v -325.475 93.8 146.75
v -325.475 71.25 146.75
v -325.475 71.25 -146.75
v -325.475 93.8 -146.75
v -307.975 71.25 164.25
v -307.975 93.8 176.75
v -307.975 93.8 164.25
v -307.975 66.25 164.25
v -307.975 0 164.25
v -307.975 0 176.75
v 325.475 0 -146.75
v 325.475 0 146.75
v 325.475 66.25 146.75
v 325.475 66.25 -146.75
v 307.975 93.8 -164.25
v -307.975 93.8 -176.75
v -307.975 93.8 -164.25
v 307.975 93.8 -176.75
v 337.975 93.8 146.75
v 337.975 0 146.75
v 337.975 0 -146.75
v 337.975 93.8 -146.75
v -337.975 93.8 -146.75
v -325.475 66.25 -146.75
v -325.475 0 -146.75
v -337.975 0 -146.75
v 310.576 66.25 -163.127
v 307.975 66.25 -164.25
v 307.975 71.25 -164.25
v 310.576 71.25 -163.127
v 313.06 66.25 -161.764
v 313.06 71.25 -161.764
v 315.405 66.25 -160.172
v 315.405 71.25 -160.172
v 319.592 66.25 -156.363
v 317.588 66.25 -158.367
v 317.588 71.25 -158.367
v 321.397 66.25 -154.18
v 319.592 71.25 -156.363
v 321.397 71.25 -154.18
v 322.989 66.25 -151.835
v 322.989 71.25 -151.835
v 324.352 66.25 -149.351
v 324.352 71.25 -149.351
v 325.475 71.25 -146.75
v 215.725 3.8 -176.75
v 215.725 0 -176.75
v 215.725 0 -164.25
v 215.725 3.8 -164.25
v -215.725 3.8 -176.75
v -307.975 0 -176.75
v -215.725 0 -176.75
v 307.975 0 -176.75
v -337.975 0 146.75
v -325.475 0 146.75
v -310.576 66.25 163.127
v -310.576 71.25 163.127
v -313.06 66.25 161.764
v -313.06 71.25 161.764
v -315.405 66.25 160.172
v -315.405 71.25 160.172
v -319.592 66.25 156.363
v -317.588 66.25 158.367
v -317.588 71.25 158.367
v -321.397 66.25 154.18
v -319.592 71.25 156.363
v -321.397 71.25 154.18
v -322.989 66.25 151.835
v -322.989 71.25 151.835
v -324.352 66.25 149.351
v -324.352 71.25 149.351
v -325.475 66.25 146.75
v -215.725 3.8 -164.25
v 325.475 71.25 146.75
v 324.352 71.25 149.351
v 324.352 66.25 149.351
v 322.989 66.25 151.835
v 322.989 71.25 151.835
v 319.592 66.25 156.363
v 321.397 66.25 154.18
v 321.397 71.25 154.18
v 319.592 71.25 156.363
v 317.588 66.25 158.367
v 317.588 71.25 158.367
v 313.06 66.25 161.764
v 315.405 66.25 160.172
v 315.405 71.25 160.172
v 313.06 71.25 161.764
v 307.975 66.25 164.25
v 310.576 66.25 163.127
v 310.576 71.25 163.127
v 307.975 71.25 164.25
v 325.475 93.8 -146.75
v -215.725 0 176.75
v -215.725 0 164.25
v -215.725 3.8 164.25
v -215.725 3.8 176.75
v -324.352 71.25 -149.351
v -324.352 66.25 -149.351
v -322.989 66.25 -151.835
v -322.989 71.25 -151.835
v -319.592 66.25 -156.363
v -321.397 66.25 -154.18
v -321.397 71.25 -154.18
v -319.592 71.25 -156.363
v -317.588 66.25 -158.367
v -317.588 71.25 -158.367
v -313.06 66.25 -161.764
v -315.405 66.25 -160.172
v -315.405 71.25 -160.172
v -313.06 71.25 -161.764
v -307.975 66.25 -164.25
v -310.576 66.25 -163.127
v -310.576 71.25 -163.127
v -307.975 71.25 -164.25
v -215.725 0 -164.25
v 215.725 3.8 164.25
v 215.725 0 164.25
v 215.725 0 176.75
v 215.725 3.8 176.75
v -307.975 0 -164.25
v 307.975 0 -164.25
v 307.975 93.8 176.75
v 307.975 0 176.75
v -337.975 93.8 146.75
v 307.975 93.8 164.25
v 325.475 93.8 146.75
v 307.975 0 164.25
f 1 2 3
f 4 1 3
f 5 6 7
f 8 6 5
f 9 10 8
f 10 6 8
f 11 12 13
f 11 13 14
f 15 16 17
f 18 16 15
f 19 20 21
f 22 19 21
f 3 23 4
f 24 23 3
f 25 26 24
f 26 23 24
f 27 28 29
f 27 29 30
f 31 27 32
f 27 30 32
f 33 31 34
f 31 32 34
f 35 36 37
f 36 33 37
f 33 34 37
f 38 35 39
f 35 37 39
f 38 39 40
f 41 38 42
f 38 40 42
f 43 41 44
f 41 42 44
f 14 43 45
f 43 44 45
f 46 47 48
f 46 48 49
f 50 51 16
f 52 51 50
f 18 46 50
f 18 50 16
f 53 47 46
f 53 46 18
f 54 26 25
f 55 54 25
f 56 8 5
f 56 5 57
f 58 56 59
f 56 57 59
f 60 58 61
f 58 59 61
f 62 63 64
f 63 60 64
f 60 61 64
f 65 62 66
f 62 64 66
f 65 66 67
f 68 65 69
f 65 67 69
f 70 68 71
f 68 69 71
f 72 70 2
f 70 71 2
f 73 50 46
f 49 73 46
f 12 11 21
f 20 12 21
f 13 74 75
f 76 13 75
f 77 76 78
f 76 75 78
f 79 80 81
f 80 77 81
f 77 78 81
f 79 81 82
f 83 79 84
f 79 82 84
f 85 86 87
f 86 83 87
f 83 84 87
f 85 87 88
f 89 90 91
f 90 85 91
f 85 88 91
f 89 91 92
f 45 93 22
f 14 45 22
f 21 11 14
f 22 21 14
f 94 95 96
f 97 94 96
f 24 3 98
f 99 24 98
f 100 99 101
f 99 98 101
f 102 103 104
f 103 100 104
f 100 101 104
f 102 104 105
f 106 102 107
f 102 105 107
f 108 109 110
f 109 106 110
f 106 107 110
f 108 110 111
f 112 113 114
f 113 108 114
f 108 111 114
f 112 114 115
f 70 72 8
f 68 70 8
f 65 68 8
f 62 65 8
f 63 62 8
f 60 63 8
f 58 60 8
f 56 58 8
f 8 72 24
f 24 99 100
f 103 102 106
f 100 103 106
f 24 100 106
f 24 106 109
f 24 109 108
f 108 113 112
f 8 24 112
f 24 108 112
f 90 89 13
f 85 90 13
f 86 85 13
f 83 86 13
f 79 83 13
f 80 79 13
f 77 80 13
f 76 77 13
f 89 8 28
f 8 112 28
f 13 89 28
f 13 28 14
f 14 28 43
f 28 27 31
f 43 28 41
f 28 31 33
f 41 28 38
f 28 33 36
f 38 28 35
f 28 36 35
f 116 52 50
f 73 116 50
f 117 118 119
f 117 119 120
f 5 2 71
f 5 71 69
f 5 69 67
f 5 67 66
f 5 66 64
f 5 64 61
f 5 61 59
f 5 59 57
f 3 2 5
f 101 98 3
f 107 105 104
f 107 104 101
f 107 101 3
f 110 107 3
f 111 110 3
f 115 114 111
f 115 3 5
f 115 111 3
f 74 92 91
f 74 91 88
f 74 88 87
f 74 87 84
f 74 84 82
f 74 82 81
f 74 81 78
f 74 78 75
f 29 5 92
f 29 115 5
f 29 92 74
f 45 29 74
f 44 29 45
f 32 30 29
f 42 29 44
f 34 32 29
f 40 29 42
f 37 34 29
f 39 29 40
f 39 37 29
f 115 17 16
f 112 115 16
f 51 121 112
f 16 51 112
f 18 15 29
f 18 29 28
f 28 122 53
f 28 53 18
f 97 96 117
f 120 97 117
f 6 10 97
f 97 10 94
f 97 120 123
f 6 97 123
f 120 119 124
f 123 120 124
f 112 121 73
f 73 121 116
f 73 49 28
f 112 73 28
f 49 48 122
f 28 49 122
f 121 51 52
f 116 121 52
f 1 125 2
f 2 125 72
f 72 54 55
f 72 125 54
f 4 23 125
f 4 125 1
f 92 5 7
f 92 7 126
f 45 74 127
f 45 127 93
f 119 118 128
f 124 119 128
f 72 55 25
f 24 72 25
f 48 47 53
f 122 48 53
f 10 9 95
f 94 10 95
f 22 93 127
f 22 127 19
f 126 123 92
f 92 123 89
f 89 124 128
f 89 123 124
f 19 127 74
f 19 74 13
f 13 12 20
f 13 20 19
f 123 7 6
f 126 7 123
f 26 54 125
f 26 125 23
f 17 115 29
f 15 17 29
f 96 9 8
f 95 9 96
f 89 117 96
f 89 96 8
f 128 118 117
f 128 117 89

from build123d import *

# Parameters (mm, degrees)
SKETCH1_W             = 12.5
SKETCH1_H             = 293.5
BOSS_EXTRUDE1_DEPTH   = 93.8
SKETCH1_W_2           = 615.95
SKETCH1_H_2           = 12.5
BOSS_EXTRUDE1_2_DEPTH = 93.8
BOSS_EXTRUDE1_3_DEPTH = 93.8
BOSS_EXTRUDE1_4_DEPTH = 93.8
SKETCH2_W             = 650.95
SKETCH2_H             = 328.5
BOSS_EXTRUDE2_DEPTH   = 5
FILLET2_R             = 30
SKETCH4_W             = 215.725
SKETCH4_H             = 3.8
CUT_EXTRUDE1_DEPTH    = 498.983725261


with BuildPart() as part:
    # Sketch1 → Boss-Extrude1 (new body)
    with BuildSketch(Plane(origin=(0, 0, 0), x_dir=(1, 0, 0), z_dir=(0, 1, 0))):
        with Locations((-331.725, 0)):
            Rectangle(SKETCH1_W, SKETCH1_H)
    extrude(amount=BOSS_EXTRUDE1_DEPTH)



with BuildPart() as body_2:
    # Sketch1 → Boss-Extrude1 2 (new body)
    with BuildSketch(Plane(origin=(0, 0, 0), x_dir=(1, 0, 0), z_dir=(0, 1, 0))):
        with Locations((0, 170.5)):
            Rectangle(SKETCH1_W_2, SKETCH1_H_2)
    extrude(amount=BOSS_EXTRUDE1_2_DEPTH)


with BuildPart() as body_3:
    # Sketch1 → Boss-Extrude1 3 (new body)
    with BuildSketch(Plane(origin=(0, 0, 0), x_dir=(1, 0, 0), z_dir=(0, 1, 0))):
        with Locations((331.725, 0)):
            Rectangle(SKETCH1_W, SKETCH1_H)
    extrude(amount=BOSS_EXTRUDE1_3_DEPTH)


with BuildPart() as body_4:
    # Sketch1 → Boss-Extrude1 4 (new body)
    with BuildSketch(Plane(origin=(0, 0, 0), x_dir=(1, 0, 0), z_dir=(0, 1, 0))):
        with Locations((0, -170.5)):
            Rectangle(SKETCH1_W_2, SKETCH1_H_2)
    extrude(amount=BOSS_EXTRUDE1_4_DEPTH)


with BuildPart() as part_1:
    add(part.part)

    add(body_2.part)  # Boss-Extrude2 merges body 2

    add(body_3.part)  # Boss-Extrude2 merges body 3

    add(body_4.part)  # Boss-Extrude2 merges body 4
    # Sketch2 → Boss-Extrude2 (add)
    with BuildSketch(Plane(origin=(0, 71.25, 0), x_dir=(1, 0, 0), z_dir=(0, 1, 0))):
        Rectangle(SKETCH2_W, SKETCH2_H)
    extrude(amount=-BOSS_EXTRUDE2_DEPTH)

    # Fillet2
    # the kernel refuses this fillet: 30 mm, written as the material it takes off along each edge
    with BuildSketch(Plane(origin=(-325.475, 115, 164.25), x_dir=(1, 0, 0), z_dir=(0, -1, 0)), Plane(origin=(-325.475, 115, -164.25), x_dir=(0, 0, 1), z_dir=(0, -1, 0)), Plane(origin=(325.475, 115, -164.25), x_dir=(-1, 0, 0), z_dir=(0, -1, 0)), Plane(origin=(325.475, 115, 164.25), x_dir=(0, 0, -1), z_dir=(0, -1, 0))) as fillet2_piece_1:
        with BuildLine():
            CenterArc((28.074531042, -28.074531042), FILLET2_R, 110.63934566, 48.721308679)
            Line((0, -17.5), (0, 0))
            Line((0, 0), (17.5, 0))
        make_face()
    extrude(amount=92.5, mode=Mode.SUBTRACT)

    # Sketch4 → Cut-Extrude1 (cut, through all)
    with BuildSketch(Plane(origin=(0, 0, -176.75), x_dir=(-1, 0, 0), z_dir=(0, 0, -1))):
        with Locations((-107.8625, 1.9)):
            Rectangle(SKETCH4_W, SKETCH4_H)
        with Locations((107.8625, 1.9)):
            Rectangle(SKETCH4_W, SKETCH4_H)
    extrude(amount=-CUT_EXTRUDE1_DEPTH, mode=Mode.SUBTRACT)


solid = part_1.part
